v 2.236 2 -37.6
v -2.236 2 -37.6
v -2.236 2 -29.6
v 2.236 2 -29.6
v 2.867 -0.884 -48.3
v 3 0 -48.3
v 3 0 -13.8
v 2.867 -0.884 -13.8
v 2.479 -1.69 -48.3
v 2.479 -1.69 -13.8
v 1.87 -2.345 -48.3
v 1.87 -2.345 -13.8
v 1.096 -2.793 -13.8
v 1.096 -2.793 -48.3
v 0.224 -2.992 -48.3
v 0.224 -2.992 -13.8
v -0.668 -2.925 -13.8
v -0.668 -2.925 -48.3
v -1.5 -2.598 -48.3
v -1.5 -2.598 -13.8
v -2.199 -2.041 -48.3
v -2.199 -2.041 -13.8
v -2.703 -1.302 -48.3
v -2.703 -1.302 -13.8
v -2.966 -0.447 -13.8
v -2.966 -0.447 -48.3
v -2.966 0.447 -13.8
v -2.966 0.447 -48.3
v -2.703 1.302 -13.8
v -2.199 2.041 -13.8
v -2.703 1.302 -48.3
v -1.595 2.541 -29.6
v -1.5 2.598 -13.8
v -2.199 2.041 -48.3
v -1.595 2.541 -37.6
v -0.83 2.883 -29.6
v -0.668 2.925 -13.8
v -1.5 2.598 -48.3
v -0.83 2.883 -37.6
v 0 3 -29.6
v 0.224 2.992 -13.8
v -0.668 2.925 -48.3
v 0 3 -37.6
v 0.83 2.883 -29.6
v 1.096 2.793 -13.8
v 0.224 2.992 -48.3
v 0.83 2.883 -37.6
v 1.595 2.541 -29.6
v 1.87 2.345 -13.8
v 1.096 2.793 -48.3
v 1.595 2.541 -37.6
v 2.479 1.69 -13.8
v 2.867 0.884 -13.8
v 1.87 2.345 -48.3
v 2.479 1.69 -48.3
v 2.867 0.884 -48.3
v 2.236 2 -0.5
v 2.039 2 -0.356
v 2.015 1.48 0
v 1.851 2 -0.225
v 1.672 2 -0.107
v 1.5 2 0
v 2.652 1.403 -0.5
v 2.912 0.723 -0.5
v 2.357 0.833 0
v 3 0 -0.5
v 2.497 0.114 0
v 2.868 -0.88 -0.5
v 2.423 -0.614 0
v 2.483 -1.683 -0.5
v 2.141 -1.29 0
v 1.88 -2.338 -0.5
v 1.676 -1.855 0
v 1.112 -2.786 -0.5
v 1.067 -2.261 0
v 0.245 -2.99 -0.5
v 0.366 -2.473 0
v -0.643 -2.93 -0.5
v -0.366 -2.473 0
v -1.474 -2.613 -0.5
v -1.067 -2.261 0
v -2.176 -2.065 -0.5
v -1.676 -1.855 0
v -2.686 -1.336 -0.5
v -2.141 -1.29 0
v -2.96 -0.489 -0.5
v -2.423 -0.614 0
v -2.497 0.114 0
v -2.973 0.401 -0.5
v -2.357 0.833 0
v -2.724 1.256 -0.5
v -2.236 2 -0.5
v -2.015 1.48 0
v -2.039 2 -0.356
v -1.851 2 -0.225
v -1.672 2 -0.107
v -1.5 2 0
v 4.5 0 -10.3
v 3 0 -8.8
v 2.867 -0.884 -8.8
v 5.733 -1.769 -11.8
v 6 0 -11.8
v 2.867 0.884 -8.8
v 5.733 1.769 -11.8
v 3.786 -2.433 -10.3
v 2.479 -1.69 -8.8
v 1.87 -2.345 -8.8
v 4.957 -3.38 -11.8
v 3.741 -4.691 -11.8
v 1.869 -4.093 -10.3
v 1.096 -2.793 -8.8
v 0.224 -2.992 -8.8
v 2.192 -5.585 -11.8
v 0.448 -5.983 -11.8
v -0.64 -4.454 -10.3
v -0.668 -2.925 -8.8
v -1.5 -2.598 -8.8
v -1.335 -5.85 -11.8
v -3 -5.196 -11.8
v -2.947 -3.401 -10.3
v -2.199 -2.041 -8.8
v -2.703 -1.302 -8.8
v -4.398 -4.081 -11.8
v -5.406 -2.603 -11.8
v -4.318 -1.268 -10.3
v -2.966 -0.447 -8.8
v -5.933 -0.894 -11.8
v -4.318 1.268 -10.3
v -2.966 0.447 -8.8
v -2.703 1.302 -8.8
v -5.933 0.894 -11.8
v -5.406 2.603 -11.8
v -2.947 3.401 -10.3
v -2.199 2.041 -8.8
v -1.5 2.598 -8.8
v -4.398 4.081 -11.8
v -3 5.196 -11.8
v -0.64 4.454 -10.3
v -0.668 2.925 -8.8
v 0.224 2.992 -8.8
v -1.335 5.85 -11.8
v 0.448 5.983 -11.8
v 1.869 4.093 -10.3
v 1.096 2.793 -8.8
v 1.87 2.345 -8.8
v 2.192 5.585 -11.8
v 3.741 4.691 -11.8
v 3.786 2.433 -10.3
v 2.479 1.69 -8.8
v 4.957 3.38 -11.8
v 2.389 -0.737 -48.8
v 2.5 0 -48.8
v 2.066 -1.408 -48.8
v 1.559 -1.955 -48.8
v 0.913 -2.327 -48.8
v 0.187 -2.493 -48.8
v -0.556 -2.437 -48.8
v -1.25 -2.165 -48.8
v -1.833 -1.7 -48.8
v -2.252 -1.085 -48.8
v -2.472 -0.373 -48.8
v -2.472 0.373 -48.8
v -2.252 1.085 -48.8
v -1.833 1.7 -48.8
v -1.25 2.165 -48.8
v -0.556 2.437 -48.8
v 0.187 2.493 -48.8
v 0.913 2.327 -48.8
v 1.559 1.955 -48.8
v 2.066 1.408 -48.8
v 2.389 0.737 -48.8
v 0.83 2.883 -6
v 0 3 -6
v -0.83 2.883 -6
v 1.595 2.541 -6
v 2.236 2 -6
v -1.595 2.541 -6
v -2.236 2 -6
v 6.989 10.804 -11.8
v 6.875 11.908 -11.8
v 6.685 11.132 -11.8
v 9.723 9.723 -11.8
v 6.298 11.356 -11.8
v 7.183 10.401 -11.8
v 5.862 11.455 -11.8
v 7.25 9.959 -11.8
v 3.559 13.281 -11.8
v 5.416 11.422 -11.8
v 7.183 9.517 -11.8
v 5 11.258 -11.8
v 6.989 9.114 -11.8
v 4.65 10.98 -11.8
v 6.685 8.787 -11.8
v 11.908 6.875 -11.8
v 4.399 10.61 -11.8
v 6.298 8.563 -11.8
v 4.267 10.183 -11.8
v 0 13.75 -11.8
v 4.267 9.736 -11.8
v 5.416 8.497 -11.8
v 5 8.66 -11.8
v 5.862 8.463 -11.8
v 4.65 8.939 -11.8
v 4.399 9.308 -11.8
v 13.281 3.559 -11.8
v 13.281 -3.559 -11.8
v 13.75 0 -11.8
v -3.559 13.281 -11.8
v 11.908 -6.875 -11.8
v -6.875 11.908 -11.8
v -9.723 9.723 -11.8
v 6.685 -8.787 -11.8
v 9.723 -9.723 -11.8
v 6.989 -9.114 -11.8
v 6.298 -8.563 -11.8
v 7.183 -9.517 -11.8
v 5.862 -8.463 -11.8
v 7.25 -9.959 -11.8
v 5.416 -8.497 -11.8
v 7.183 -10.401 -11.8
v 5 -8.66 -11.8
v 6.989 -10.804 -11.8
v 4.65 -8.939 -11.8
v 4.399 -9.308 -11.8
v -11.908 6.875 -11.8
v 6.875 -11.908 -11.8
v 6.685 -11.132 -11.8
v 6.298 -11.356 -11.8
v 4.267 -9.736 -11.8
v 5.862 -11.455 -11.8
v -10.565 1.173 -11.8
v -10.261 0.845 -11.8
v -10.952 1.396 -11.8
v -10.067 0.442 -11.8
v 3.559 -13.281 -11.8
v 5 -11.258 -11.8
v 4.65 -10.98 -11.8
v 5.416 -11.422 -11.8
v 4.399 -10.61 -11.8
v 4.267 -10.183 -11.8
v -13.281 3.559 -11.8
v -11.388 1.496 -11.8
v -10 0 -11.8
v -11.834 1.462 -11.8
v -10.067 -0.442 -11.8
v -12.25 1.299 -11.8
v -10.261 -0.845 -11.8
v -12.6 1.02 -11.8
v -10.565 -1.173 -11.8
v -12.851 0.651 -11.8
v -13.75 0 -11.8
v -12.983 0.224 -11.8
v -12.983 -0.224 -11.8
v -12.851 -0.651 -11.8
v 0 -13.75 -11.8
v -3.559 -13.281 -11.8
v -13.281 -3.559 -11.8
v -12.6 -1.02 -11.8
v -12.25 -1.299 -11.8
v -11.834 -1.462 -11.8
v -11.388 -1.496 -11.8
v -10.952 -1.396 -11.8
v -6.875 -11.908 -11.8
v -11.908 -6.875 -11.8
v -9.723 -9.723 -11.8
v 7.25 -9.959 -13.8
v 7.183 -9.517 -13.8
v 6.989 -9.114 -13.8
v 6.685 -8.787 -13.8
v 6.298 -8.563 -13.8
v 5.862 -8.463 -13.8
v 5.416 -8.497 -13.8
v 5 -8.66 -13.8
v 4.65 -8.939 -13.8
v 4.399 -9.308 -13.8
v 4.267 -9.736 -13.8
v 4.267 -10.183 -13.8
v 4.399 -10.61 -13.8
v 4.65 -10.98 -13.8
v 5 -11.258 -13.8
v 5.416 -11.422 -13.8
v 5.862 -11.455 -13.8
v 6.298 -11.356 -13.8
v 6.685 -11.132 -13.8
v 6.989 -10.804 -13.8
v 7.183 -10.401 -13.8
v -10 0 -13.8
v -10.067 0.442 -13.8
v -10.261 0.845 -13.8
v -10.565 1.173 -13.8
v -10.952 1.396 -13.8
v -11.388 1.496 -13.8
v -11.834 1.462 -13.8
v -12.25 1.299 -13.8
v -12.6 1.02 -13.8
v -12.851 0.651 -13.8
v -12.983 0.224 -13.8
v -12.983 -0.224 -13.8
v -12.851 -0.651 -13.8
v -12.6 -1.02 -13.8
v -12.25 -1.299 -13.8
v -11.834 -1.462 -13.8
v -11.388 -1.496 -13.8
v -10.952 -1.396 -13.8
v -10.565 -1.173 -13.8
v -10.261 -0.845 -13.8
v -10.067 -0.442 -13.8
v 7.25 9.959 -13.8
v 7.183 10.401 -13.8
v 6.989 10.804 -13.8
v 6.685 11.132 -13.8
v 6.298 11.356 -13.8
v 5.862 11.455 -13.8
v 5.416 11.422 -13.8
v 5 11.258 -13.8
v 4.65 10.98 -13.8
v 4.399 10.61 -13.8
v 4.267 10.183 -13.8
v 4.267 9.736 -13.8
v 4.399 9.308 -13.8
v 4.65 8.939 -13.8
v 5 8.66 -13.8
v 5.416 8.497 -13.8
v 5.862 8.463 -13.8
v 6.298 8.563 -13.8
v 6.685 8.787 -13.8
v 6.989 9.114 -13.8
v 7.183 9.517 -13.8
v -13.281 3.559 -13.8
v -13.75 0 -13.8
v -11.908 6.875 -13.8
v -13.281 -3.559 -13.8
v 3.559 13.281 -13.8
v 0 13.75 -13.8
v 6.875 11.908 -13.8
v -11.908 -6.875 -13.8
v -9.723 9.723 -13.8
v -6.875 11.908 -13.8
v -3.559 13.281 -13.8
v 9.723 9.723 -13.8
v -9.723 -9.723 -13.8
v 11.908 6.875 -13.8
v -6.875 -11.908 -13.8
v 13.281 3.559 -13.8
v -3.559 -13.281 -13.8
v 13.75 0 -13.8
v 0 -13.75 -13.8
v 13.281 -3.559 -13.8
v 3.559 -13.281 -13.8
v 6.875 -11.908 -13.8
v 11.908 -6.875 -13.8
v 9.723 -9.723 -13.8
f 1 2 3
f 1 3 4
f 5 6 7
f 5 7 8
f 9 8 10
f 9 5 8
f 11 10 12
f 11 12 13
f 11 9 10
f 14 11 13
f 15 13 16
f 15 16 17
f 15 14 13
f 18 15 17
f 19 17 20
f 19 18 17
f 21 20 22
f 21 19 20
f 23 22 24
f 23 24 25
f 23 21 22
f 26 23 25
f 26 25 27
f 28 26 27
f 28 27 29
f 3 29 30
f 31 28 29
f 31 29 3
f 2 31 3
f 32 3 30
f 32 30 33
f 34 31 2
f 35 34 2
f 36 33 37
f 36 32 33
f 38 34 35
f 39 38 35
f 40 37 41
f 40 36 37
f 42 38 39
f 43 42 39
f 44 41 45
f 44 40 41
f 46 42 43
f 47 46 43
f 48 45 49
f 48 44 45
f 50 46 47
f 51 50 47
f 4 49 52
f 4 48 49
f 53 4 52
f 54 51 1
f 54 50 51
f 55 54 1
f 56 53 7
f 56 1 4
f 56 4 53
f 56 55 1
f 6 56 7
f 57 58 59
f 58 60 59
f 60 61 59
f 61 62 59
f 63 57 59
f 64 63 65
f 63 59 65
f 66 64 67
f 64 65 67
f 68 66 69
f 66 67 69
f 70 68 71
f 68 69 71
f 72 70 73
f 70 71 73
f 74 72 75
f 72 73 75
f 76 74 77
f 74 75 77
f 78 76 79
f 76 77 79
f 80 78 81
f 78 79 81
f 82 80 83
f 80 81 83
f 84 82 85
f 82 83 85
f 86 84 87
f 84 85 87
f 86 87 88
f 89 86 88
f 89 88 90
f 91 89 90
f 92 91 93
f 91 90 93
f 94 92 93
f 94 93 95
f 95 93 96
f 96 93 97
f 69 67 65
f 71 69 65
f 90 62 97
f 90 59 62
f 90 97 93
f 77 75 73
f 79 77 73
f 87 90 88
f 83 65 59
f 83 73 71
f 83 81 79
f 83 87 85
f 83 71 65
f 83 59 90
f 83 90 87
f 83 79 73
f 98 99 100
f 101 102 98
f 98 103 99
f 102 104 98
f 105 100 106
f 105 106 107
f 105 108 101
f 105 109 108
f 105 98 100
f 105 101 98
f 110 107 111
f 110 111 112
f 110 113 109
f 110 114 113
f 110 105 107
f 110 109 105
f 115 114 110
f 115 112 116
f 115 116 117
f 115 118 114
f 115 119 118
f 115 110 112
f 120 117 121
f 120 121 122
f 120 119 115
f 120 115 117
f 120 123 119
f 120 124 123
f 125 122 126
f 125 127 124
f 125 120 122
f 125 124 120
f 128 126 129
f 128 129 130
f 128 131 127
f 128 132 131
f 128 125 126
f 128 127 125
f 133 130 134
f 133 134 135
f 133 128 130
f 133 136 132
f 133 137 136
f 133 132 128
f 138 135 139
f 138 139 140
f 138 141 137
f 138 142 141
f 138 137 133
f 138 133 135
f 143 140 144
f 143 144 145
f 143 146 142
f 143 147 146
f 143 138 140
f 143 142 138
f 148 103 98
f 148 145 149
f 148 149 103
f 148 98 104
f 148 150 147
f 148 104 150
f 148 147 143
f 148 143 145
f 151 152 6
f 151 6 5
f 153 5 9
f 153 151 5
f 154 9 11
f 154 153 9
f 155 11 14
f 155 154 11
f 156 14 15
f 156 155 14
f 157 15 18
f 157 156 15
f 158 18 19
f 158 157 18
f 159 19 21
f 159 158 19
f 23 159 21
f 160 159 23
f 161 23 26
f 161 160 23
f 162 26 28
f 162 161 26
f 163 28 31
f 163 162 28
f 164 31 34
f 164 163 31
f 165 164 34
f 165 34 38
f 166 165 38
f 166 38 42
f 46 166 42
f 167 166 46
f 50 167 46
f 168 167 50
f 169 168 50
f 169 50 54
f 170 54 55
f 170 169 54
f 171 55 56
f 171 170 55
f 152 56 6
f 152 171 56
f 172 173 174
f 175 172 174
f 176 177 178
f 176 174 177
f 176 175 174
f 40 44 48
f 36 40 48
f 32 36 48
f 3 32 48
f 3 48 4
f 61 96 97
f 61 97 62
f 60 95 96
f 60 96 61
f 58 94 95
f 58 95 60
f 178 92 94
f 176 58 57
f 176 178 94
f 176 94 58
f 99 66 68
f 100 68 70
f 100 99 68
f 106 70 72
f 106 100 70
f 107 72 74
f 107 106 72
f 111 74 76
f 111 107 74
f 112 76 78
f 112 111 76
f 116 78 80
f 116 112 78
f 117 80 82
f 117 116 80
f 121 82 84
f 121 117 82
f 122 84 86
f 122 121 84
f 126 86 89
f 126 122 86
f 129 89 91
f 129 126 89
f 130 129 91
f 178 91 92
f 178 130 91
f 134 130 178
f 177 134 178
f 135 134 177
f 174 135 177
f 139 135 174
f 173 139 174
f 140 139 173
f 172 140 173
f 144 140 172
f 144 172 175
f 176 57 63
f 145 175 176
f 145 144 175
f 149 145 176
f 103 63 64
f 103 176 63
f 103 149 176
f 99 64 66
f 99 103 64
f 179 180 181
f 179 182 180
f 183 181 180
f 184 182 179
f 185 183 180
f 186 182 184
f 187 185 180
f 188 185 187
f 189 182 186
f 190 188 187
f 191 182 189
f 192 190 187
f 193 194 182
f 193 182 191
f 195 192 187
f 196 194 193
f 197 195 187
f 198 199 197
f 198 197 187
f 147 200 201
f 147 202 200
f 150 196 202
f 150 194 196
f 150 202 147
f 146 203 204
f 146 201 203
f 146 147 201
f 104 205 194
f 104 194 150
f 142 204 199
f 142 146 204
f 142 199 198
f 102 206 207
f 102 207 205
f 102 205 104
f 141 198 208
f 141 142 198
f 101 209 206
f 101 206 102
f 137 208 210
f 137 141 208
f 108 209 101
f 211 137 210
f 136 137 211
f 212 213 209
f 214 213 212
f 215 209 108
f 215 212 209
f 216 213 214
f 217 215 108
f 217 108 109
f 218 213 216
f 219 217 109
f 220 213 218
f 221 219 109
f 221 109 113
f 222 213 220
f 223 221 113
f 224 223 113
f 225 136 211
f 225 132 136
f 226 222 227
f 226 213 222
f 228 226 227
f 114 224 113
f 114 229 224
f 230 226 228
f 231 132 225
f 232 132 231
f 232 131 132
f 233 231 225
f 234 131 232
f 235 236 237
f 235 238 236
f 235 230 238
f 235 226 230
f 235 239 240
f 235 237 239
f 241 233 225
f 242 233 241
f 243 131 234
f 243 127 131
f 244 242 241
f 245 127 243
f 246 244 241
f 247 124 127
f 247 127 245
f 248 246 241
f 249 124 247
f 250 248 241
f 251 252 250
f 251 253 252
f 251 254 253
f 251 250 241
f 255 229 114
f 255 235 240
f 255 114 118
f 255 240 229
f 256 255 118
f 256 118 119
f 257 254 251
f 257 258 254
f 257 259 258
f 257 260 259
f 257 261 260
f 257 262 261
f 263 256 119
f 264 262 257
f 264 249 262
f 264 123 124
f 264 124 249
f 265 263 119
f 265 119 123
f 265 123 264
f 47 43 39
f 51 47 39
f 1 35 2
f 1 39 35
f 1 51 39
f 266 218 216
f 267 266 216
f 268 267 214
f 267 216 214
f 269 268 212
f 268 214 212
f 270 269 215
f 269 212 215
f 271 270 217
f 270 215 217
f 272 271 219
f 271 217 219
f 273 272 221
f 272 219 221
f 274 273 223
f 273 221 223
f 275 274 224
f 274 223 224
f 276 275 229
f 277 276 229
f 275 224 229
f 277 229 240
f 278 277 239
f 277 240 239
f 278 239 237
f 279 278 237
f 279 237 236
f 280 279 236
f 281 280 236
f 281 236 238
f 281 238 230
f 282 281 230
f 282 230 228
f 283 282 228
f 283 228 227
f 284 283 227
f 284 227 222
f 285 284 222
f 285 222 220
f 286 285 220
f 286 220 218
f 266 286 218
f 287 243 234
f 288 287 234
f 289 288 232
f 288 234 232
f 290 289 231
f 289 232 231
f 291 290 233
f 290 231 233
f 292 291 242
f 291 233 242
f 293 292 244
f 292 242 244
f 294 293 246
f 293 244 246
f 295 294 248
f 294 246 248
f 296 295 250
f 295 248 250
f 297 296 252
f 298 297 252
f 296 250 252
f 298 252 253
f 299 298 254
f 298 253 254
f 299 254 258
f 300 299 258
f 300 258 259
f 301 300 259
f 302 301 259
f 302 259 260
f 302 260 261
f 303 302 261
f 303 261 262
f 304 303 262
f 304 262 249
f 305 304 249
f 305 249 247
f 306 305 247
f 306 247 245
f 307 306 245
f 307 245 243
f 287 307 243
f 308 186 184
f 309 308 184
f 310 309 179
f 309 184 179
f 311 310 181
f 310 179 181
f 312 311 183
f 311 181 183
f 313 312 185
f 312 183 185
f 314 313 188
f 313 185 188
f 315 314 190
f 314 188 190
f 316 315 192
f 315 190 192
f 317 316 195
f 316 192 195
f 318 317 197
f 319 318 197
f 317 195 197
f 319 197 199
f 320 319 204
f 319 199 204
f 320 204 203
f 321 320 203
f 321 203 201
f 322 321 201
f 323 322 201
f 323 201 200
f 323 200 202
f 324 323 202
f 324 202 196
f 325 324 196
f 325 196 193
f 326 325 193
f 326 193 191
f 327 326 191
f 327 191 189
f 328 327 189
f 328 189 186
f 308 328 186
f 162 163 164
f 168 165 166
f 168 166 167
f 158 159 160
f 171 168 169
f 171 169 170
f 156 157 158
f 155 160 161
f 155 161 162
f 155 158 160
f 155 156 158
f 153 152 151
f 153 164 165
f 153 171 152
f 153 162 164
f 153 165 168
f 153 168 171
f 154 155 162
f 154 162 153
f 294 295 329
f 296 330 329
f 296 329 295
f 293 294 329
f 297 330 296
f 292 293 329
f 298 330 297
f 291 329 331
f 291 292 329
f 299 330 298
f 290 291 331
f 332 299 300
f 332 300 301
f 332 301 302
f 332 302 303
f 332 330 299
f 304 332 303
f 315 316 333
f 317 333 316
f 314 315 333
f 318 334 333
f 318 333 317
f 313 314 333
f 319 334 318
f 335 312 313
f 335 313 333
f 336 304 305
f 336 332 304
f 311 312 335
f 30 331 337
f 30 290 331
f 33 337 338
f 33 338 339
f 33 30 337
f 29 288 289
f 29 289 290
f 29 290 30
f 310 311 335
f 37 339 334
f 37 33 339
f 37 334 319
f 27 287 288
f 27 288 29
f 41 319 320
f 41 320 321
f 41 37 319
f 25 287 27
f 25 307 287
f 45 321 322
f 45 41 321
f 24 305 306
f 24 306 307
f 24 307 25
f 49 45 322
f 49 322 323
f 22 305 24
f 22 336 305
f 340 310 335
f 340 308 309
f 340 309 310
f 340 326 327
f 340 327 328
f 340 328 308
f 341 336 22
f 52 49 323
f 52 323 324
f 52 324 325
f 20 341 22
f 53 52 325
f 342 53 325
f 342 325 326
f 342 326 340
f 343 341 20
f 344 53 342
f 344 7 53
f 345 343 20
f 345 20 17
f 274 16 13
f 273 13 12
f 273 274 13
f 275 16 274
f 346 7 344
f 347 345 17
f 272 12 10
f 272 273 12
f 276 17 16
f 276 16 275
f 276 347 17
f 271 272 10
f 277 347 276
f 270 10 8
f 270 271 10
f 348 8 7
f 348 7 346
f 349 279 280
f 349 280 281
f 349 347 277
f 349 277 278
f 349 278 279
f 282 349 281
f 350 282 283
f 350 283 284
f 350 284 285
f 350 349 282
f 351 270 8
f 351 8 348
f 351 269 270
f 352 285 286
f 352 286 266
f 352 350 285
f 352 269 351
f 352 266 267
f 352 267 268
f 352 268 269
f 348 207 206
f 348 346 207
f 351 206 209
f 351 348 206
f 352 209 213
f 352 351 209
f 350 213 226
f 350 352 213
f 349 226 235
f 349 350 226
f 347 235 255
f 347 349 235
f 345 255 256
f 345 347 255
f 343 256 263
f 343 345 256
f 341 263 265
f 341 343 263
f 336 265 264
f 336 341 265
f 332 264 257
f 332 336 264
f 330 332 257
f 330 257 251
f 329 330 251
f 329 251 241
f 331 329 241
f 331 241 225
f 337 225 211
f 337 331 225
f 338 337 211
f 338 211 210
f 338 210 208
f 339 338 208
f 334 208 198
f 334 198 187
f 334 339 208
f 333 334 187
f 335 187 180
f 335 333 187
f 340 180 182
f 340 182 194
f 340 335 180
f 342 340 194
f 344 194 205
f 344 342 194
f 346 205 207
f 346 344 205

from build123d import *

# Parameters (mm, degrees)
CUT_EXTRUDE_START   = 3
SKETCH_2_W          = 6
SKETCH_2_H          = 8
SKETCH_2_H_2        = 6
CUT_EXTRUDE_1_DEPTH = 1
CHAMFER_1_SIZE      = 3
SKETCH_3_R          = 1.5
CUT_EXTRUDE_4_DEPTH = 42.798624379
CHAMFER_2_SIZE      = 0.5


with BuildPart() as part:
    # 草图1 → 旋转1 (revolve)
    with BuildSketch(Plane(origin=(0, 0, 0), x_dir=(0, 0, -1), z_dir=(1, 0, 0)), mode=Mode.PRIVATE) as revolve_1_sk:
        Polygon((0, 0), (0, 3), (11.8, 3), (11.8, 13.75), (13.8, 13.75), (13.8, 3), (48.8, 3), (48.8, 0), align=None)
    revolve(revolve_1_sk.sketch.rotate(Axis((0, 0, 33.540983607), (0, 0, -1)), 90), axis=Axis((0, 0, 33.540983607), (0, 0, -1)))

    # 草图2 → 切除-拉伸1 (cut)
    with BuildSketch(Plane(origin=(0, 0, 0), x_dir=(1, 0, 0), z_dir=(0, 1, 0)).offset(CUT_EXTRUDE_START)):
        with Locations((0, 33.6)):
            Rectangle(SKETCH_2_W, SKETCH_2_H)
        with Locations((0, 3)):
            Rectangle(SKETCH_2_W, SKETCH_2_H_2)
    extrude(amount=-CUT_EXTRUDE_1_DEPTH, mode=Mode.SUBTRACT)

    # 倒角1
    chamfer_1_edges = [part.edges().sort_by_distance(p)[0] for p in [
        (-3, 0, -11.8),
    ]]
    chamfer(chamfer_1_edges, length=CHAMFER_1_SIZE)

    # 草图3 → 切除-拉伸4 (cut, through all)
    with BuildSketch(Plane.XY.offset(-11.8)):
        with Locations((5.75, -9.959292144)):
            Circle(SKETCH_3_R)
        with Locations((-11.5, 0)):
            Circle(SKETCH_3_R)
        with Locations((5.75, 9.959292144)):
            Circle(SKETCH_3_R)
    extrude(amount=-CUT_EXTRUDE_4_DEPTH, mode=Mode.SUBTRACT)

    # 倒角2
    chamfer_2_edges = [part.edges().sort_by_distance(p)[0] for p in [
        (-1.070466269, -2.802517077, 0),
        (-3, 0, -48.8),
    ]]
    chamfer(chamfer_2_edges, length=CHAMFER_2_SIZE)


solid = part.part
